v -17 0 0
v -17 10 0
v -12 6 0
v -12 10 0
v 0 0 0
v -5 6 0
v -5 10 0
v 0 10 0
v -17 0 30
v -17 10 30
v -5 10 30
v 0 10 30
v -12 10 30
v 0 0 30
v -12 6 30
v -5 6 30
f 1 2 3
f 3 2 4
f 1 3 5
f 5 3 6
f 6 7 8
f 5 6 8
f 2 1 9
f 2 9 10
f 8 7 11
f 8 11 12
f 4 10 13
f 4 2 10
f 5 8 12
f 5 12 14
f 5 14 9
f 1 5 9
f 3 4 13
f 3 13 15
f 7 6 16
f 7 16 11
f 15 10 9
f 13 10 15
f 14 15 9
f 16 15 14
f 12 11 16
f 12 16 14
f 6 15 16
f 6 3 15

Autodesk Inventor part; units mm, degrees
ref_plane "YZ Plane" through (0, 0, 0) normal (1, 0, 0) x (0, 1, 0)
ref_plane "XZ Plane" through (0, 0, 0) normal (0, 1, 0) x (-1, 0, 0)
ref_plane "XY Plane" through (0, 0, 0) normal (0, 0, 1) x (1, 0, 0)
sketch "Sketch1" plane through (0, 0, 0) normal (0, 0, 1) x (1, 0, 0)
  line L0 (0, 0) -> (-17, 0)
  line L1 (-17, 0) -> (-17, 10)
  line L2 (-17, 10) -> (0, 10)
  line L3 (0, 10) -> (0, 0)
  line L4 (-5, 10) -> (-12, 10)
  line L5 (-12, 10) -> (-12, 6)
  line L6 (-12, 6) -> (-5, 6)
  line L7 (-5, 6) -> (-5, 10)
  dimension "d0" = 17
  dimension "d2" = 4
  dimension "d3" = 7
  dimension "d4" = 5
  dimension "d5" = 6
extrude "Extrusion1" add sketch "Sketch1" along normal blind 30 contours L0 L1 L2 L5 L6 L7 L3
properties part number "Top Rack V2"
